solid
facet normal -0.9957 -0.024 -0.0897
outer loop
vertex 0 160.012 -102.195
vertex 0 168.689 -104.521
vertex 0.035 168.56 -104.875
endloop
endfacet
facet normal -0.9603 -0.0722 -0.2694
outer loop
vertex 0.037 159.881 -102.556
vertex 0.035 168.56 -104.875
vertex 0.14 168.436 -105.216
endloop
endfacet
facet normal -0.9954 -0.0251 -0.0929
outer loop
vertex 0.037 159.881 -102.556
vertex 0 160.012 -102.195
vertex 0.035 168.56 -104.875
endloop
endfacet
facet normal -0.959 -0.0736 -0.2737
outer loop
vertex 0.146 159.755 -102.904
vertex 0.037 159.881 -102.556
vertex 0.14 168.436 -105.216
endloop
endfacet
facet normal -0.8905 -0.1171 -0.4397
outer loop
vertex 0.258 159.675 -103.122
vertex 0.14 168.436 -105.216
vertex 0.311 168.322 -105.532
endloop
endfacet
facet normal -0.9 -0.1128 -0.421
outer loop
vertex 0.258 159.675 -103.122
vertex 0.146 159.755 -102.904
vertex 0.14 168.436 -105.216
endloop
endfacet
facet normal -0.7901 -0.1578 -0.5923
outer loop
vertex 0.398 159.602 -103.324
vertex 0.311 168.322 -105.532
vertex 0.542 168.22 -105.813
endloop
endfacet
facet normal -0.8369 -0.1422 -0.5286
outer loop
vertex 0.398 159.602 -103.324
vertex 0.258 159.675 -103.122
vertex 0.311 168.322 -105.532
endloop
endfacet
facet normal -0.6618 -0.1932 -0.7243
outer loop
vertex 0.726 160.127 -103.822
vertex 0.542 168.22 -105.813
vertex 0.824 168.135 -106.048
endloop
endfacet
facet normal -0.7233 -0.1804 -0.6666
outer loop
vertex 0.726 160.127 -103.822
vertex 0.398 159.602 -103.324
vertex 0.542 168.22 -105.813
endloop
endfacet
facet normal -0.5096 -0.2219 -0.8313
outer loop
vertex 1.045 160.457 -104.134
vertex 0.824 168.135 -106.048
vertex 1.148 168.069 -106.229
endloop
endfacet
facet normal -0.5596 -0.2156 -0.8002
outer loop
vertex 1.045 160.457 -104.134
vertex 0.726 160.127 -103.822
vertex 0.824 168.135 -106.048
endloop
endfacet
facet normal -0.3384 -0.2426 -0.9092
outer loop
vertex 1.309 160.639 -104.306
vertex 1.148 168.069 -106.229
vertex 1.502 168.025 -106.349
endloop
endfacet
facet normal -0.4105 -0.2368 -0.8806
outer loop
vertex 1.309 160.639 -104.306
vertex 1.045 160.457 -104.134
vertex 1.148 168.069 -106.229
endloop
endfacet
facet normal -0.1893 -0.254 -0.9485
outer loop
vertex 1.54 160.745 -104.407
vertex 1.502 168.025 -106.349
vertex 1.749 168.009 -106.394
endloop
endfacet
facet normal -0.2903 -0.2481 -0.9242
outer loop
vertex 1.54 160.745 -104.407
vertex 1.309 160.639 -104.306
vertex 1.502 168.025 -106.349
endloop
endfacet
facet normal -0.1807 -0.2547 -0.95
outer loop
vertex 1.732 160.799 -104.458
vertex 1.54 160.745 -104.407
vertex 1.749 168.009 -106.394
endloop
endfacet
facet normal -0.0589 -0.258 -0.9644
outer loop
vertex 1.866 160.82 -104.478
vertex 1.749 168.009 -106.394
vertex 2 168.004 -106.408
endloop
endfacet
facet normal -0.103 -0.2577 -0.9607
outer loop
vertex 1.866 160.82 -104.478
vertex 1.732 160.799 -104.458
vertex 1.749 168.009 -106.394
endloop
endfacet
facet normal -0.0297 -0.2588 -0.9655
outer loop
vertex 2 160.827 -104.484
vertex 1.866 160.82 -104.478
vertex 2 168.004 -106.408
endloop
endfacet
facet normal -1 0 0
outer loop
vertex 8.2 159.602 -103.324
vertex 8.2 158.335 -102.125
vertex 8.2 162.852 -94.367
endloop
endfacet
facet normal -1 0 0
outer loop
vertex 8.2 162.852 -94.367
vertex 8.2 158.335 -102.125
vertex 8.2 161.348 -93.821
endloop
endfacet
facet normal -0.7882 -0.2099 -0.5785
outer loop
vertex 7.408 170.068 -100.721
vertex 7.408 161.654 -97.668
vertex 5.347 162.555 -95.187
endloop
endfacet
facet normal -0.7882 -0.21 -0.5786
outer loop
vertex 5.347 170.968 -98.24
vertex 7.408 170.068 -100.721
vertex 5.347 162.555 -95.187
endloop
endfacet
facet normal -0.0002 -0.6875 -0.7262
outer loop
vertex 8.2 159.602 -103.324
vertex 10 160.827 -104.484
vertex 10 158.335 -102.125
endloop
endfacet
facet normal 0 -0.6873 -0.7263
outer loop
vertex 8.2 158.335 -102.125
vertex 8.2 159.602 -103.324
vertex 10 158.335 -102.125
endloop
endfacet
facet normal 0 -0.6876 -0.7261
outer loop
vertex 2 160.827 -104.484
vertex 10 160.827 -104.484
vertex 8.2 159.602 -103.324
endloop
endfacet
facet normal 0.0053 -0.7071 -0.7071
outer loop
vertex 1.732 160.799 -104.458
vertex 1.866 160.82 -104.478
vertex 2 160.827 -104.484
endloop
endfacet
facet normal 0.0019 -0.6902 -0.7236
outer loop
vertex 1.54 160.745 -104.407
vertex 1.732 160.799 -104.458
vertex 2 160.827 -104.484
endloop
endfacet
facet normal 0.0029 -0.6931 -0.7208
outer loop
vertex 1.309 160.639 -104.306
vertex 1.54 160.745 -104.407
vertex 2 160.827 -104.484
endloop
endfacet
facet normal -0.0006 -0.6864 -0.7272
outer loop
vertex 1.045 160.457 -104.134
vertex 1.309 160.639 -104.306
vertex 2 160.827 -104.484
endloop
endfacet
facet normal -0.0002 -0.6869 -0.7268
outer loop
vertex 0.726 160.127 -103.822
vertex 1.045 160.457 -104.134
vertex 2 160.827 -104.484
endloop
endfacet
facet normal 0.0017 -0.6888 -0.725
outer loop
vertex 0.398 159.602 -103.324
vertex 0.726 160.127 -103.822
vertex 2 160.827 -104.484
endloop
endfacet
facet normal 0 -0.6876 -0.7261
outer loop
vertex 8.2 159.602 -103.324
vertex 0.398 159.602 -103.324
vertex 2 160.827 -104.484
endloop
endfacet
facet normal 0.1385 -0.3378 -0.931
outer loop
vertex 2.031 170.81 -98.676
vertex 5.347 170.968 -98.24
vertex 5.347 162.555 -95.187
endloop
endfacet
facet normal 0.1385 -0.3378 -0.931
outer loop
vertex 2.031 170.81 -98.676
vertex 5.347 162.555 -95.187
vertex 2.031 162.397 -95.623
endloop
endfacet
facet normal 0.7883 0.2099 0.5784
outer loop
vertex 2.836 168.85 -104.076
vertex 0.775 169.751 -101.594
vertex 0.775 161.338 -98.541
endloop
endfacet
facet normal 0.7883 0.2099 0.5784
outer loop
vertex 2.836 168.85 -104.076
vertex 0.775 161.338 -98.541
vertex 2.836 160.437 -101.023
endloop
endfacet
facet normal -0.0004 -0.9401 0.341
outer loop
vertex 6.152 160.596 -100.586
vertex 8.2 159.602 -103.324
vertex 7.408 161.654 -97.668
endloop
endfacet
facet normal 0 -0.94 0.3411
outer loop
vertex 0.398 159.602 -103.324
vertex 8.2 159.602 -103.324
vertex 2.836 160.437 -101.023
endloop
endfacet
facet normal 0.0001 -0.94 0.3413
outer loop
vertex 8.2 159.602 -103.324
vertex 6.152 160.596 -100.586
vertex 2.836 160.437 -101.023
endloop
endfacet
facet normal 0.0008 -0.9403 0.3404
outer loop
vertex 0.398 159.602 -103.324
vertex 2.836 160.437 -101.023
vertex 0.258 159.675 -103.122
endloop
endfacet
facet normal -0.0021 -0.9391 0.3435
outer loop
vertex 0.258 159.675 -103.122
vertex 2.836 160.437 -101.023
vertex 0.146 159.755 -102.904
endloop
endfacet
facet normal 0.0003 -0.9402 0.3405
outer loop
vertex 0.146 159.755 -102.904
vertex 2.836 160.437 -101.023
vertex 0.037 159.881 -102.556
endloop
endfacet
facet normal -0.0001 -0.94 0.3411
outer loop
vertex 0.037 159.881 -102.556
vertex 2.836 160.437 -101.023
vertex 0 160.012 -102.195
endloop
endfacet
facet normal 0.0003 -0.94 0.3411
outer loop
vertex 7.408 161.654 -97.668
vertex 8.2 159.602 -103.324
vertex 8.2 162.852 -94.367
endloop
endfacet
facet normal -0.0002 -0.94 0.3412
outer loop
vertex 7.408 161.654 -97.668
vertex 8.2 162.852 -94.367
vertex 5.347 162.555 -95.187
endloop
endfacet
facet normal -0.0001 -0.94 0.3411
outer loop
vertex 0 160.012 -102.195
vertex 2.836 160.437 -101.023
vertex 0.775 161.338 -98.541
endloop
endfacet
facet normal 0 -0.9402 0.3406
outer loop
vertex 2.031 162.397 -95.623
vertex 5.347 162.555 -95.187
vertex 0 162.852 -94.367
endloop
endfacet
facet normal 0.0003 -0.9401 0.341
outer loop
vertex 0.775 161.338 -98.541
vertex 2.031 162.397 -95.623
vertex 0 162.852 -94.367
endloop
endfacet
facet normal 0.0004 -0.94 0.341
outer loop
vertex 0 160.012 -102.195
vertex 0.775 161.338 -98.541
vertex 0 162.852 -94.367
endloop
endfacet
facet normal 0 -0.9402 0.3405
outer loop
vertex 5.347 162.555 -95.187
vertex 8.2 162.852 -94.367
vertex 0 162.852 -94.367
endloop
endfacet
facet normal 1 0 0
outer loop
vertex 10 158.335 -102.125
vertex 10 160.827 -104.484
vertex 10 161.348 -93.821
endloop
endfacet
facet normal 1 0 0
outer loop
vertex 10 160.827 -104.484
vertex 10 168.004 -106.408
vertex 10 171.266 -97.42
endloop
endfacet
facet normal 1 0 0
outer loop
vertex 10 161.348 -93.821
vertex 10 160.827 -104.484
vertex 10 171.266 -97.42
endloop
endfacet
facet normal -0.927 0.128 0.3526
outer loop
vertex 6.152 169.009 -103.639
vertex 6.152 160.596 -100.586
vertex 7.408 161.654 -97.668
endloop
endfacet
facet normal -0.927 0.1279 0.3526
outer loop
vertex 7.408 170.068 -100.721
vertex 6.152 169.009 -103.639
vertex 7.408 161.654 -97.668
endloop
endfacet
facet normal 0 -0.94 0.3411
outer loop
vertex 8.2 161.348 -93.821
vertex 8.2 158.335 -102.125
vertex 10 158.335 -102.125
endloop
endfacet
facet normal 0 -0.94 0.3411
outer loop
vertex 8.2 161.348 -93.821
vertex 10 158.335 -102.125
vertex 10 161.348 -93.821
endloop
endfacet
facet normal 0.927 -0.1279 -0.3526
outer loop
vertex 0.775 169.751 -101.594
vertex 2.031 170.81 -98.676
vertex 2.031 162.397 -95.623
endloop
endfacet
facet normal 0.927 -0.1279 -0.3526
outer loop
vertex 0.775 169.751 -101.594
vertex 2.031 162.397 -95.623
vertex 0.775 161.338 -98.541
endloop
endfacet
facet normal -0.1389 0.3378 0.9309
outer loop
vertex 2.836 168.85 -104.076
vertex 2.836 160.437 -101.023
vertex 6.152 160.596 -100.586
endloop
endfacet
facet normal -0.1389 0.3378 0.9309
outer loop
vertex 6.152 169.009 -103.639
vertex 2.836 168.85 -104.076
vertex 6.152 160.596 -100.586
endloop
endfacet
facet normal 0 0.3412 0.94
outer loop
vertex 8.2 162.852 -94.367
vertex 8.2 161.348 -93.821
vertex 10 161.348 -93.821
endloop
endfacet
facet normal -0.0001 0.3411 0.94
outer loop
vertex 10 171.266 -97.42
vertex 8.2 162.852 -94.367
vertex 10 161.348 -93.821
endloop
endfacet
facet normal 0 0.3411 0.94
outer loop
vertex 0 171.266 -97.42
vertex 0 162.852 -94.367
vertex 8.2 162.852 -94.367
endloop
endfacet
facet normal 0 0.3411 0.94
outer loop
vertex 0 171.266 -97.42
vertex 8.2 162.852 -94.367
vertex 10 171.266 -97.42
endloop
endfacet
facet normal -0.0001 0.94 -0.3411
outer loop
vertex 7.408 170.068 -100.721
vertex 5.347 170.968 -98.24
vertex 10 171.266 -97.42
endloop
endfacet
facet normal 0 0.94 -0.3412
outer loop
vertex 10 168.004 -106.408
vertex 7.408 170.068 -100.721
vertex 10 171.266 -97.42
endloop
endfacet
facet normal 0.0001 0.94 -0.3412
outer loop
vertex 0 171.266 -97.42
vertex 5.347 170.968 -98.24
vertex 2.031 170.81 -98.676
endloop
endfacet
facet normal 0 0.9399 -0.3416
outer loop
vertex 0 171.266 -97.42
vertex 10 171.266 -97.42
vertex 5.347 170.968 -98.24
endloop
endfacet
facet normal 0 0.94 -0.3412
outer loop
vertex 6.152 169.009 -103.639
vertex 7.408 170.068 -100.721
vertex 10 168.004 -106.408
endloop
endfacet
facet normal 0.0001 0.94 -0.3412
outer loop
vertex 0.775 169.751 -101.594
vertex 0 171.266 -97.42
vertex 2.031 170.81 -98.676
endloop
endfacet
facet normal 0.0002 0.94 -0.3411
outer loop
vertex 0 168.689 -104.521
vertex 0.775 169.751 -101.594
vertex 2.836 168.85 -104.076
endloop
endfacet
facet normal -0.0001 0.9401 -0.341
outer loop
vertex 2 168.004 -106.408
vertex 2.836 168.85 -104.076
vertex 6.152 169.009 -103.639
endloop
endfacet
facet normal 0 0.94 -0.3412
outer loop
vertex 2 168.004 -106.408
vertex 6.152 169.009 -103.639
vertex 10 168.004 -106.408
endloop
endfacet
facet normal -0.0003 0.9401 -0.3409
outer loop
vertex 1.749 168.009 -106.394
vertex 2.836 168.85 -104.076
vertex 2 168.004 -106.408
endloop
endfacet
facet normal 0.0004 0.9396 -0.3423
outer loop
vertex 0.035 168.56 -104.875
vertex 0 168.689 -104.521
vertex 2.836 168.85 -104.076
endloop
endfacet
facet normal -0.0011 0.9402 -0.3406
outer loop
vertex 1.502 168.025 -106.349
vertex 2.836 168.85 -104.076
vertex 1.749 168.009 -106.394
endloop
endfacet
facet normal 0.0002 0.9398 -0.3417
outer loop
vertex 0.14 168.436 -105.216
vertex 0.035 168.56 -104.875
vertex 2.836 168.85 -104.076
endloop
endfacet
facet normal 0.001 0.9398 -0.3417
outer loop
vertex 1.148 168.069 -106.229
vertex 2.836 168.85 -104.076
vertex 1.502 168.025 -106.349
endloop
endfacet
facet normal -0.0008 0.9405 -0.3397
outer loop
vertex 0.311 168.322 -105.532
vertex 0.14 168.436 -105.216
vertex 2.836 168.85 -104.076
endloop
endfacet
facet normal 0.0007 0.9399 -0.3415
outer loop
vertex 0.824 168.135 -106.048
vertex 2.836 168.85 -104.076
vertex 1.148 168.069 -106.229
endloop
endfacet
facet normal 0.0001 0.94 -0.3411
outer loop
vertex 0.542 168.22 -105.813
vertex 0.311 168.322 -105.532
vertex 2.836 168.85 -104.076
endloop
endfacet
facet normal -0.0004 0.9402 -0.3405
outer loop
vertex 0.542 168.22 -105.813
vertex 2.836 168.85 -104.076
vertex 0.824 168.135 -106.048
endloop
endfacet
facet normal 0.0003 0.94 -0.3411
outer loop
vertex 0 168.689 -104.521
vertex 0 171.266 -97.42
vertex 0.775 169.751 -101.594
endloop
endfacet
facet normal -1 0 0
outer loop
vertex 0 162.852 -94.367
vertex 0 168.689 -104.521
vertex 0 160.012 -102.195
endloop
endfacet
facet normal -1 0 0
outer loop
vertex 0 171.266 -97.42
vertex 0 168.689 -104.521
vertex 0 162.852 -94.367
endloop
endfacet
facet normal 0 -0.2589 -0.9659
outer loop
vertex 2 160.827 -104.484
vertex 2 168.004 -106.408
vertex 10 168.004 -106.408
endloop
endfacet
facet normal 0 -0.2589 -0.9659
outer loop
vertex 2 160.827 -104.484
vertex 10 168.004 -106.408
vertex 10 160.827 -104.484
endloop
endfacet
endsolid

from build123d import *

# Parameters (mm, degrees)
BOSS_EXTRUDE1_DEPTH = 10
CUT_EXTRUDE1_DEPTH  = 12
CUT_EXTRUDE2_DEPTH  = 1.6
FILLET1_R           = 2


with BuildPart() as part:
    # Sketch1 → Boss-Extrude1 (new body)
    with BuildSketch(Plane(origin=(0, 0, 0), x_dir=(0, 0, -1), z_dir=(1, 0, 0))):
        Polygon((102.124722519, 158.335097964), (93.821109228, 161.348394189), (97.419958261, 171.26559065), (106.408476892, 168.00374929), (104.484281292, 160.826776001), align=None)
    extrude(amount=BOSS_EXTRUDE1_DEPTH)

    # Sketch2 → Cut-Extrude1 (cut)
    with BuildSketch(Plane(origin=(0, 96.421451451, -272.737546345), x_dir=(1, 0, 0), z_dir=(0, -0.940018622, 0.341123131))):
        Polygon((2.031147255, 188.996331096), (0.775279506, 185.892119516), (2.835671718, 183.252400352), (6.151931679, 183.716892768), (7.407799428, 186.821104348), (5.347407216, 189.460823512), align=None)
    extrude(amount=-CUT_EXTRUDE1_DEPTH, mode=Mode.SUBTRACT)

    # Sketch3 → Cut-Extrude2 (cut)
    with BuildSketch(Plane(origin=(0, 172.657963315, -62.655806689), x_dir=(1, 0, 0), z_dir=(0, -0.940018622, 0.341123131))):
        Polygon((0, -33.153920374), (8.2, -33.153920374), (8.2, -42.73147424), (8.2, -44.631348282), (0, -44.631348282), (0, -42.73147424), align=None)
    extrude(amount=-CUT_EXTRUDE2_DEPTH, mode=Mode.SUBTRACT)

    # Fillet1
    fillet1_edges = [part.edges().sort_by_distance(p)[0] for p in [
        (0, 164.415262646, -105.446379092),
    ]]
    fillet(fillet1_edges, radius=FILLET1_R)


solid = part.part
